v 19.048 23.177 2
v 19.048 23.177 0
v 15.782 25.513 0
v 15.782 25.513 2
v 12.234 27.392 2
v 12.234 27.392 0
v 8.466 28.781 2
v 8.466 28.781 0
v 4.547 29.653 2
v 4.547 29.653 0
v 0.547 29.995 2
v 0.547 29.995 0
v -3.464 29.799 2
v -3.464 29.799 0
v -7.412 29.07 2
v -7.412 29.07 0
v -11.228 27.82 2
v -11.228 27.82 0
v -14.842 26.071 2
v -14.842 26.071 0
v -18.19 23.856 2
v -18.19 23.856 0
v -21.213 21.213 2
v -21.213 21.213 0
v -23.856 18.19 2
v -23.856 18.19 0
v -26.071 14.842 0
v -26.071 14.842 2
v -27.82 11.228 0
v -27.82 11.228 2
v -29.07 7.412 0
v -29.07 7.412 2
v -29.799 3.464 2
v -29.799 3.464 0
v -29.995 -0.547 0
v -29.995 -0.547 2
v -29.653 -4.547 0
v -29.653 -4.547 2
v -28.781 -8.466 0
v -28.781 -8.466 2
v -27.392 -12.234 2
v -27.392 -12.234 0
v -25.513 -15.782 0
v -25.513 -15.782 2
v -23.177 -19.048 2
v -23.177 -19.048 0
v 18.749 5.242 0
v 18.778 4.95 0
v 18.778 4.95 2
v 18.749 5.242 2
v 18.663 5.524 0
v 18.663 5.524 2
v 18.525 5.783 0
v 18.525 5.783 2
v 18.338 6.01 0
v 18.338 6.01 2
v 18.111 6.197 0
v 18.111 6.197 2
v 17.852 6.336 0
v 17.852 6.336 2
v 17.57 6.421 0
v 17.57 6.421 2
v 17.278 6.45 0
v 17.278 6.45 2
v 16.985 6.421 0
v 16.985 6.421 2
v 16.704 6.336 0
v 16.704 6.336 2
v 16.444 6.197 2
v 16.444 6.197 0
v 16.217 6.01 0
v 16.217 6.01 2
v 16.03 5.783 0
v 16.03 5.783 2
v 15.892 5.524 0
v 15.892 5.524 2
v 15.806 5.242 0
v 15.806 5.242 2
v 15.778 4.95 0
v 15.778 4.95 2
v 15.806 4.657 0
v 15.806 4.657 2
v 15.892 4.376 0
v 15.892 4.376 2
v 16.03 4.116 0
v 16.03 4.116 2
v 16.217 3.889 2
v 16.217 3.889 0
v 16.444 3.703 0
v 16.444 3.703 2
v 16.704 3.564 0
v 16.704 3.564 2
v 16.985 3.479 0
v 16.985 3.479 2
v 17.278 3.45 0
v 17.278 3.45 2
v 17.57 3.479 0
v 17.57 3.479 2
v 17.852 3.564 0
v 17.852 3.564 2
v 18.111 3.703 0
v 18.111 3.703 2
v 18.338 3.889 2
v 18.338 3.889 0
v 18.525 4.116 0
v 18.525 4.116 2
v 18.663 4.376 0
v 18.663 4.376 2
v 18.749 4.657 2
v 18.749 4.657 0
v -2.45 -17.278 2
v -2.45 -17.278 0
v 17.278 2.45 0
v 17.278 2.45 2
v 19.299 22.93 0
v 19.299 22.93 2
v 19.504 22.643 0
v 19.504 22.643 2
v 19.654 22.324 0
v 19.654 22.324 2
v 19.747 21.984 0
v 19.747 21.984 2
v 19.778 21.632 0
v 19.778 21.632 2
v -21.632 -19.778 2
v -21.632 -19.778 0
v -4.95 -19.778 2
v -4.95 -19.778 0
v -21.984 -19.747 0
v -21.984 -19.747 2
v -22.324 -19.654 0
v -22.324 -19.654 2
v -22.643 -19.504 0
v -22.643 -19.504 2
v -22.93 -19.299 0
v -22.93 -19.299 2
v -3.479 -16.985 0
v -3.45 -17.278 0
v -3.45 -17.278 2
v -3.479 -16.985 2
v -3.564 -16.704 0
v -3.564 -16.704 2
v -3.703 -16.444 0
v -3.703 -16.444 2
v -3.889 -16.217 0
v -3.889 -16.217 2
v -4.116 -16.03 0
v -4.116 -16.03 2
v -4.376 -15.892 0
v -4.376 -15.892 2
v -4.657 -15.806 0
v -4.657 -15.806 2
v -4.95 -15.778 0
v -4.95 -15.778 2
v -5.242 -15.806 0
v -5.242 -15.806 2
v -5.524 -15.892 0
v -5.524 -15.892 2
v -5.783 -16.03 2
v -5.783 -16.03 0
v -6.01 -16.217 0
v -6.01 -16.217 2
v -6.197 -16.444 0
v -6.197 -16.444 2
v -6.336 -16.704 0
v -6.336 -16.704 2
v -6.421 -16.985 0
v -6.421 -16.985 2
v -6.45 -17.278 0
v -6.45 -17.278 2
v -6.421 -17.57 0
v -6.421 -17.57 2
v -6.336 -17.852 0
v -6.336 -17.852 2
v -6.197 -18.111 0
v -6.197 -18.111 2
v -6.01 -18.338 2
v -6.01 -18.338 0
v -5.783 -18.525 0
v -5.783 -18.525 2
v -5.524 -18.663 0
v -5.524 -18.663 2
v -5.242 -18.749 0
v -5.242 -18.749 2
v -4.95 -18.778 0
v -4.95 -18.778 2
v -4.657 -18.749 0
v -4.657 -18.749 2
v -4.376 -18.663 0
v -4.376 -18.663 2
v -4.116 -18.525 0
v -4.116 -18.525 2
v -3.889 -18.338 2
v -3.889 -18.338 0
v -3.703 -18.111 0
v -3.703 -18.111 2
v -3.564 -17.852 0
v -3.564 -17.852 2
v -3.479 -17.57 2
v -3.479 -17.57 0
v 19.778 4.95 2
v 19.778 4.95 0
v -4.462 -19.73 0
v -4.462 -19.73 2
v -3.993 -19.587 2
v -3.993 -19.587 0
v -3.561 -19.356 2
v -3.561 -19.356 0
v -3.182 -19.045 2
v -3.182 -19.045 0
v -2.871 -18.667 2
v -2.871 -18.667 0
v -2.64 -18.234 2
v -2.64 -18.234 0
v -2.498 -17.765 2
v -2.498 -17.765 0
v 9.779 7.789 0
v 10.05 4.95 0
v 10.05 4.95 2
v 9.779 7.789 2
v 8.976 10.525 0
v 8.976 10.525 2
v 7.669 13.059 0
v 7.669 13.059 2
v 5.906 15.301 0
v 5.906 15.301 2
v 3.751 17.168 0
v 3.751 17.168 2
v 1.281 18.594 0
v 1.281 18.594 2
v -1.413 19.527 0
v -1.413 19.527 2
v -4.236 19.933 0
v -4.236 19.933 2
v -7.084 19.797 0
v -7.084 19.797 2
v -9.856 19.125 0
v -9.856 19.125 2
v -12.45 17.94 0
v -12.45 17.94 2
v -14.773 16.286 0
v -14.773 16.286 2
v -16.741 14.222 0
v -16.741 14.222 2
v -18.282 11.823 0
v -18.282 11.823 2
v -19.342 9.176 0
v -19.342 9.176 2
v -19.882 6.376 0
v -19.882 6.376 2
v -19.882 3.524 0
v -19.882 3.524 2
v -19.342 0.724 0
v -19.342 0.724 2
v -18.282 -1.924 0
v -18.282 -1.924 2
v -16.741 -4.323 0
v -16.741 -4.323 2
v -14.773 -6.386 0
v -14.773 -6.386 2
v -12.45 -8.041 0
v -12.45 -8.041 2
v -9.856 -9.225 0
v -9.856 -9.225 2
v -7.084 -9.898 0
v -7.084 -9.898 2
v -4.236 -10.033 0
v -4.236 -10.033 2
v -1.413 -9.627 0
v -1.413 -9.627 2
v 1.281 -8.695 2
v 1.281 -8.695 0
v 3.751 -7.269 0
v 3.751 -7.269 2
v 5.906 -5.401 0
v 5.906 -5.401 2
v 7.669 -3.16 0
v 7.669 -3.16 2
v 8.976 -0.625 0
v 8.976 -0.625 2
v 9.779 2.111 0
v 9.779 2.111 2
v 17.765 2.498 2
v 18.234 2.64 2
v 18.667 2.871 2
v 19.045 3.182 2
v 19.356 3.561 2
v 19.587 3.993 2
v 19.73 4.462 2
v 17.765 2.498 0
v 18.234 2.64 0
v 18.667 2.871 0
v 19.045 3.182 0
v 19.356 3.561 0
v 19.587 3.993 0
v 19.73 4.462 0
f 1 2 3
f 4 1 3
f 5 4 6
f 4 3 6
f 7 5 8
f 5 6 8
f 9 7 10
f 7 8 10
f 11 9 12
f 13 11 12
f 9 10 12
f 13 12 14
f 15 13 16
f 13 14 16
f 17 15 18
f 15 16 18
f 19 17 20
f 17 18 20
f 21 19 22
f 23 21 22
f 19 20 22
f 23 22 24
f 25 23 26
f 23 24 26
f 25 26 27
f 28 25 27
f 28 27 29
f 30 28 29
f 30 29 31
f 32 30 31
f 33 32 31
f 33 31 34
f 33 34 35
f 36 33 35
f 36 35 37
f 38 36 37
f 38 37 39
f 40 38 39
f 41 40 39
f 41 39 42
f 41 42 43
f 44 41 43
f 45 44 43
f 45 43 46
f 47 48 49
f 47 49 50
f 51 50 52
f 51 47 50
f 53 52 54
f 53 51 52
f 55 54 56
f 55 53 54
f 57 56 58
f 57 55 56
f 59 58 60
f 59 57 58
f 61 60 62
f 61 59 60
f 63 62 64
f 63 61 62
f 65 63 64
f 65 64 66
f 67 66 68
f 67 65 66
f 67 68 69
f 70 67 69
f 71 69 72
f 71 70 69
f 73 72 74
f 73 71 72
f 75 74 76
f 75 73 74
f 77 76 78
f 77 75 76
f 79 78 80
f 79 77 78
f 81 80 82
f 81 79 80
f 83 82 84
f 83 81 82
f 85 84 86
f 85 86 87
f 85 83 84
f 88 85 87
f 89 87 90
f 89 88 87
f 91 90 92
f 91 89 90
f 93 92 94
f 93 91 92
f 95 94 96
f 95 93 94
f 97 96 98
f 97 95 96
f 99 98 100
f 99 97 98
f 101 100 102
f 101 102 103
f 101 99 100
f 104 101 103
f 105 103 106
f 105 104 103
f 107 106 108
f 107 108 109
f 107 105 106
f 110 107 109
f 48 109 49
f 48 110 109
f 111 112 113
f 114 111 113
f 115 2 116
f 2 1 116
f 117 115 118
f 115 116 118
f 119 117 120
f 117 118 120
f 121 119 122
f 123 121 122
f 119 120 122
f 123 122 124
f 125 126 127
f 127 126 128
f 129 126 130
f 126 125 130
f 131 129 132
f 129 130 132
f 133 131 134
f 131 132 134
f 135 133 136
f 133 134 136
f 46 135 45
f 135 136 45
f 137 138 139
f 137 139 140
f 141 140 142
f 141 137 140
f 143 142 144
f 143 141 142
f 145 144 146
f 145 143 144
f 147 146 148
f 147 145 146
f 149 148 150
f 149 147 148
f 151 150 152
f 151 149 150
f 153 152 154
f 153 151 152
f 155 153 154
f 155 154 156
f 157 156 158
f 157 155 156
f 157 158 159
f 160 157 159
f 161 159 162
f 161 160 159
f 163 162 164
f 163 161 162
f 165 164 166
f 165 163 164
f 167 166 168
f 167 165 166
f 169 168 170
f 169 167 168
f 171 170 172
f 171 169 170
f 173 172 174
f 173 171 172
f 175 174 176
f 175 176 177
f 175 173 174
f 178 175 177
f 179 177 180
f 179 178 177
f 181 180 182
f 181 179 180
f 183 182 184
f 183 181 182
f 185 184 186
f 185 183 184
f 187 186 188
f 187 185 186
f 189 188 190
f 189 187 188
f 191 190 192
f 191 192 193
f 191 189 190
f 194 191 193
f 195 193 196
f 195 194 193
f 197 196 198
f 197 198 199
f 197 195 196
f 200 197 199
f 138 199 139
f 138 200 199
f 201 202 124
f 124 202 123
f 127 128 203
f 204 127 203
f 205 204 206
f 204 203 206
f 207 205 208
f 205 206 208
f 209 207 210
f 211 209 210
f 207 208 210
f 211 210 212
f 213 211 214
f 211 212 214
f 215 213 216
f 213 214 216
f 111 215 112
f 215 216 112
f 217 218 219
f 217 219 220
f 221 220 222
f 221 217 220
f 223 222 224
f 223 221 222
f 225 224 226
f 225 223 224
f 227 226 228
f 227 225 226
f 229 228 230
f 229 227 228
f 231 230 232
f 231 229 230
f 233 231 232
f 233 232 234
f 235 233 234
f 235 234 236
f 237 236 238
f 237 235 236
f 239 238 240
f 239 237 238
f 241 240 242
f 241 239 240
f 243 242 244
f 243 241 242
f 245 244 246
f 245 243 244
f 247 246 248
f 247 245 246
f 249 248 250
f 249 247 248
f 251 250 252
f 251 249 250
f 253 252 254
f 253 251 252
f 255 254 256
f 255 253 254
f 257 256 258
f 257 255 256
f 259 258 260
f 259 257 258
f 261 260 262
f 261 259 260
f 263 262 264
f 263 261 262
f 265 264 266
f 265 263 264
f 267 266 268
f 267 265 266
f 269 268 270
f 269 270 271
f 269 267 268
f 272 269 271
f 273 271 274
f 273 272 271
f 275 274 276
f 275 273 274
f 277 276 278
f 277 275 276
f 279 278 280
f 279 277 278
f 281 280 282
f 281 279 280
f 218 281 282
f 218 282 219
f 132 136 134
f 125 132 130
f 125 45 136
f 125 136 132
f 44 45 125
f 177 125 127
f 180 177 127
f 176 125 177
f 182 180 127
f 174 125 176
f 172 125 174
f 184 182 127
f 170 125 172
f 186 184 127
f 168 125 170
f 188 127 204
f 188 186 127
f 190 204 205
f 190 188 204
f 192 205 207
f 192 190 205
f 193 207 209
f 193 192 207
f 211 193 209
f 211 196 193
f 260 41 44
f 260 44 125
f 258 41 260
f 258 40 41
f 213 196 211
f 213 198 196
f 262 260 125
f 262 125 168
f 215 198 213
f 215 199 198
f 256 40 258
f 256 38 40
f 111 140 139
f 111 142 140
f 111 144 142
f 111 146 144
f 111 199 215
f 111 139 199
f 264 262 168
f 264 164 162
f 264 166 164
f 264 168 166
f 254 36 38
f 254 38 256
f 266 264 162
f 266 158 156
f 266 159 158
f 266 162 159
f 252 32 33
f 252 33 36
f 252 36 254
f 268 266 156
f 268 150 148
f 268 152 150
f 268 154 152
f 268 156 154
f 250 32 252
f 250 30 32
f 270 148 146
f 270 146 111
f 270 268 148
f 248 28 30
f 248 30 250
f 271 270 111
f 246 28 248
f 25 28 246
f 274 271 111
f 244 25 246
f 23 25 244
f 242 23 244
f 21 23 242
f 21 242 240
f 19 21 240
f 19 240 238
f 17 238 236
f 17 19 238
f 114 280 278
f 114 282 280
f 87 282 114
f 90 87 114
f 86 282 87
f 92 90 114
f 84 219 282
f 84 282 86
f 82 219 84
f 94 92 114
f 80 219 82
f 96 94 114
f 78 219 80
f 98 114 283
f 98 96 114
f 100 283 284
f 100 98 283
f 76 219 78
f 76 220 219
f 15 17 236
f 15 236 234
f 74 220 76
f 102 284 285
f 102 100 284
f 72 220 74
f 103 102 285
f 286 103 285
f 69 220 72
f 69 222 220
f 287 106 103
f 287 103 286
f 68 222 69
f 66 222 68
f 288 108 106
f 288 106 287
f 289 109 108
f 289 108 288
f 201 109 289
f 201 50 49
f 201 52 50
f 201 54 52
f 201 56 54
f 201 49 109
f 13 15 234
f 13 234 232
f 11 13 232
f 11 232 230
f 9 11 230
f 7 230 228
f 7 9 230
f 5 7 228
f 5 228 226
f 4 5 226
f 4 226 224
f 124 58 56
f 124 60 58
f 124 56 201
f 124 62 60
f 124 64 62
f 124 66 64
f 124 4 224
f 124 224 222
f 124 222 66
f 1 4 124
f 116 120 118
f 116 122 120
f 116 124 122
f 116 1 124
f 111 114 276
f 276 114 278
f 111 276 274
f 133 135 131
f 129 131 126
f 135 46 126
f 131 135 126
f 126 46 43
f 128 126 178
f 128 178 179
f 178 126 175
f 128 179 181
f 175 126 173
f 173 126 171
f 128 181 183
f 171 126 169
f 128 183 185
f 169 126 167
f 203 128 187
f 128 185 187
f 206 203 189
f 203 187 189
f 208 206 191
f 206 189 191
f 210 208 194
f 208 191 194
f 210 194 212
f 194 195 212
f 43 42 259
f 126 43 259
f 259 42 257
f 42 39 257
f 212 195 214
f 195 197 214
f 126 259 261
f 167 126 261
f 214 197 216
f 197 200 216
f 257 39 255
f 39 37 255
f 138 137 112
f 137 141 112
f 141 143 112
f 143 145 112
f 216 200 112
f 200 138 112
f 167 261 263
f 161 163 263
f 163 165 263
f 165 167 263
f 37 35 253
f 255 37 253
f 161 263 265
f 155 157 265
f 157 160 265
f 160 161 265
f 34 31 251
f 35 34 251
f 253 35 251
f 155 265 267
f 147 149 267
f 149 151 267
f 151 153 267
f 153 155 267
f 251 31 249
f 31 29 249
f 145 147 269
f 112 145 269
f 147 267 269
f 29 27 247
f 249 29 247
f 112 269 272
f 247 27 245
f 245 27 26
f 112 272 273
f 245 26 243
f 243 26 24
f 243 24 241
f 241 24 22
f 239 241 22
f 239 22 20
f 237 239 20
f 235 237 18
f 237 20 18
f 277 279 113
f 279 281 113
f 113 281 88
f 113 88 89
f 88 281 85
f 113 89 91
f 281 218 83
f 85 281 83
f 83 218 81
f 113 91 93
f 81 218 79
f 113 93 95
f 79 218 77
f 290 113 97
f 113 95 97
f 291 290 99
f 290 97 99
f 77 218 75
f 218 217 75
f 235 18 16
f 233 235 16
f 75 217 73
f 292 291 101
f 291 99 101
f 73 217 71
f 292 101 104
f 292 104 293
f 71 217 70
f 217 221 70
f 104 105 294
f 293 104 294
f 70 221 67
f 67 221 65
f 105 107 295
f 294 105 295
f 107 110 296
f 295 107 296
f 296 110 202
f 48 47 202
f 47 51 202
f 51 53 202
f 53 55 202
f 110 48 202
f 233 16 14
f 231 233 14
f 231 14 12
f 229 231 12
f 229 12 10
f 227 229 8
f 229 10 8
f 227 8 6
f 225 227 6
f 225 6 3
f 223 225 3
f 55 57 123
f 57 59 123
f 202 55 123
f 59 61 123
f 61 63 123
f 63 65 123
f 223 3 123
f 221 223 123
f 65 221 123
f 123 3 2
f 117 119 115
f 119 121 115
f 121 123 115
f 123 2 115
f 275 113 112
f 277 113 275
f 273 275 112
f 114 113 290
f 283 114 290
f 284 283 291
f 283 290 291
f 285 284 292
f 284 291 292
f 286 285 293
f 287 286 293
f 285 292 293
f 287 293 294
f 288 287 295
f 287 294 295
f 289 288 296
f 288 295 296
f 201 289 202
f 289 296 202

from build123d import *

# Parameters (mm, degrees)
SKETCH1_R           = 15
SKETCH1_R_2         = 1.5
BOSS_EXTRUDE1_DEPTH = 2
FILLET1_R           = 2


with BuildPart() as part:
    # Sketch1 → Boss-Extrude1 (new body)
    with BuildSketch(Plane.XY):
        with BuildLine():
            Line((-22.557559524, -19.777677021), (-4.949747468, -19.777677021))
            ThreePointArc((-4.949747468, -19.777677021), (-3.181980515, -19.045443974), (-2.449747468, -17.277677021))
            Line((-2.449747468, -17.277677021), (17.277677021, 2.449747468))
            ThreePointArc((17.277677021, 2.449747468), (19.045443974, 3.181980515), (19.777677021, 4.949747468))
            Line((19.777677021, 4.949747468), (19.777677021, 22.557559524))
            ThreePointArc((19.777677021, 22.557559524), (-21.213203436, 21.213203436), (-22.557559524, -19.777677021))
        make_face()
        with Locations((-4.949747468, 4.949747468)):
            Circle(SKETCH1_R, mode=Mode.SUBTRACT)
        with Locations((-4.949747468, -17.277677021)):
            Circle(SKETCH1_R_2, mode=Mode.SUBTRACT)
        with Locations((17.277677021, 4.949747468)):
            Circle(SKETCH1_R_2, mode=Mode.SUBTRACT)
    extrude(amount=BOSS_EXTRUDE1_DEPTH)

    # Fillet1
    fillet1_edges = [part.edges().sort_by_distance(p)[0] for p in [
        (-22.557559524, -19.777677021, 1),
        (19.777677021, 22.557559524, 1),
    ]]
    fillet(fillet1_edges, radius=FILLET1_R)


solid = part.part
